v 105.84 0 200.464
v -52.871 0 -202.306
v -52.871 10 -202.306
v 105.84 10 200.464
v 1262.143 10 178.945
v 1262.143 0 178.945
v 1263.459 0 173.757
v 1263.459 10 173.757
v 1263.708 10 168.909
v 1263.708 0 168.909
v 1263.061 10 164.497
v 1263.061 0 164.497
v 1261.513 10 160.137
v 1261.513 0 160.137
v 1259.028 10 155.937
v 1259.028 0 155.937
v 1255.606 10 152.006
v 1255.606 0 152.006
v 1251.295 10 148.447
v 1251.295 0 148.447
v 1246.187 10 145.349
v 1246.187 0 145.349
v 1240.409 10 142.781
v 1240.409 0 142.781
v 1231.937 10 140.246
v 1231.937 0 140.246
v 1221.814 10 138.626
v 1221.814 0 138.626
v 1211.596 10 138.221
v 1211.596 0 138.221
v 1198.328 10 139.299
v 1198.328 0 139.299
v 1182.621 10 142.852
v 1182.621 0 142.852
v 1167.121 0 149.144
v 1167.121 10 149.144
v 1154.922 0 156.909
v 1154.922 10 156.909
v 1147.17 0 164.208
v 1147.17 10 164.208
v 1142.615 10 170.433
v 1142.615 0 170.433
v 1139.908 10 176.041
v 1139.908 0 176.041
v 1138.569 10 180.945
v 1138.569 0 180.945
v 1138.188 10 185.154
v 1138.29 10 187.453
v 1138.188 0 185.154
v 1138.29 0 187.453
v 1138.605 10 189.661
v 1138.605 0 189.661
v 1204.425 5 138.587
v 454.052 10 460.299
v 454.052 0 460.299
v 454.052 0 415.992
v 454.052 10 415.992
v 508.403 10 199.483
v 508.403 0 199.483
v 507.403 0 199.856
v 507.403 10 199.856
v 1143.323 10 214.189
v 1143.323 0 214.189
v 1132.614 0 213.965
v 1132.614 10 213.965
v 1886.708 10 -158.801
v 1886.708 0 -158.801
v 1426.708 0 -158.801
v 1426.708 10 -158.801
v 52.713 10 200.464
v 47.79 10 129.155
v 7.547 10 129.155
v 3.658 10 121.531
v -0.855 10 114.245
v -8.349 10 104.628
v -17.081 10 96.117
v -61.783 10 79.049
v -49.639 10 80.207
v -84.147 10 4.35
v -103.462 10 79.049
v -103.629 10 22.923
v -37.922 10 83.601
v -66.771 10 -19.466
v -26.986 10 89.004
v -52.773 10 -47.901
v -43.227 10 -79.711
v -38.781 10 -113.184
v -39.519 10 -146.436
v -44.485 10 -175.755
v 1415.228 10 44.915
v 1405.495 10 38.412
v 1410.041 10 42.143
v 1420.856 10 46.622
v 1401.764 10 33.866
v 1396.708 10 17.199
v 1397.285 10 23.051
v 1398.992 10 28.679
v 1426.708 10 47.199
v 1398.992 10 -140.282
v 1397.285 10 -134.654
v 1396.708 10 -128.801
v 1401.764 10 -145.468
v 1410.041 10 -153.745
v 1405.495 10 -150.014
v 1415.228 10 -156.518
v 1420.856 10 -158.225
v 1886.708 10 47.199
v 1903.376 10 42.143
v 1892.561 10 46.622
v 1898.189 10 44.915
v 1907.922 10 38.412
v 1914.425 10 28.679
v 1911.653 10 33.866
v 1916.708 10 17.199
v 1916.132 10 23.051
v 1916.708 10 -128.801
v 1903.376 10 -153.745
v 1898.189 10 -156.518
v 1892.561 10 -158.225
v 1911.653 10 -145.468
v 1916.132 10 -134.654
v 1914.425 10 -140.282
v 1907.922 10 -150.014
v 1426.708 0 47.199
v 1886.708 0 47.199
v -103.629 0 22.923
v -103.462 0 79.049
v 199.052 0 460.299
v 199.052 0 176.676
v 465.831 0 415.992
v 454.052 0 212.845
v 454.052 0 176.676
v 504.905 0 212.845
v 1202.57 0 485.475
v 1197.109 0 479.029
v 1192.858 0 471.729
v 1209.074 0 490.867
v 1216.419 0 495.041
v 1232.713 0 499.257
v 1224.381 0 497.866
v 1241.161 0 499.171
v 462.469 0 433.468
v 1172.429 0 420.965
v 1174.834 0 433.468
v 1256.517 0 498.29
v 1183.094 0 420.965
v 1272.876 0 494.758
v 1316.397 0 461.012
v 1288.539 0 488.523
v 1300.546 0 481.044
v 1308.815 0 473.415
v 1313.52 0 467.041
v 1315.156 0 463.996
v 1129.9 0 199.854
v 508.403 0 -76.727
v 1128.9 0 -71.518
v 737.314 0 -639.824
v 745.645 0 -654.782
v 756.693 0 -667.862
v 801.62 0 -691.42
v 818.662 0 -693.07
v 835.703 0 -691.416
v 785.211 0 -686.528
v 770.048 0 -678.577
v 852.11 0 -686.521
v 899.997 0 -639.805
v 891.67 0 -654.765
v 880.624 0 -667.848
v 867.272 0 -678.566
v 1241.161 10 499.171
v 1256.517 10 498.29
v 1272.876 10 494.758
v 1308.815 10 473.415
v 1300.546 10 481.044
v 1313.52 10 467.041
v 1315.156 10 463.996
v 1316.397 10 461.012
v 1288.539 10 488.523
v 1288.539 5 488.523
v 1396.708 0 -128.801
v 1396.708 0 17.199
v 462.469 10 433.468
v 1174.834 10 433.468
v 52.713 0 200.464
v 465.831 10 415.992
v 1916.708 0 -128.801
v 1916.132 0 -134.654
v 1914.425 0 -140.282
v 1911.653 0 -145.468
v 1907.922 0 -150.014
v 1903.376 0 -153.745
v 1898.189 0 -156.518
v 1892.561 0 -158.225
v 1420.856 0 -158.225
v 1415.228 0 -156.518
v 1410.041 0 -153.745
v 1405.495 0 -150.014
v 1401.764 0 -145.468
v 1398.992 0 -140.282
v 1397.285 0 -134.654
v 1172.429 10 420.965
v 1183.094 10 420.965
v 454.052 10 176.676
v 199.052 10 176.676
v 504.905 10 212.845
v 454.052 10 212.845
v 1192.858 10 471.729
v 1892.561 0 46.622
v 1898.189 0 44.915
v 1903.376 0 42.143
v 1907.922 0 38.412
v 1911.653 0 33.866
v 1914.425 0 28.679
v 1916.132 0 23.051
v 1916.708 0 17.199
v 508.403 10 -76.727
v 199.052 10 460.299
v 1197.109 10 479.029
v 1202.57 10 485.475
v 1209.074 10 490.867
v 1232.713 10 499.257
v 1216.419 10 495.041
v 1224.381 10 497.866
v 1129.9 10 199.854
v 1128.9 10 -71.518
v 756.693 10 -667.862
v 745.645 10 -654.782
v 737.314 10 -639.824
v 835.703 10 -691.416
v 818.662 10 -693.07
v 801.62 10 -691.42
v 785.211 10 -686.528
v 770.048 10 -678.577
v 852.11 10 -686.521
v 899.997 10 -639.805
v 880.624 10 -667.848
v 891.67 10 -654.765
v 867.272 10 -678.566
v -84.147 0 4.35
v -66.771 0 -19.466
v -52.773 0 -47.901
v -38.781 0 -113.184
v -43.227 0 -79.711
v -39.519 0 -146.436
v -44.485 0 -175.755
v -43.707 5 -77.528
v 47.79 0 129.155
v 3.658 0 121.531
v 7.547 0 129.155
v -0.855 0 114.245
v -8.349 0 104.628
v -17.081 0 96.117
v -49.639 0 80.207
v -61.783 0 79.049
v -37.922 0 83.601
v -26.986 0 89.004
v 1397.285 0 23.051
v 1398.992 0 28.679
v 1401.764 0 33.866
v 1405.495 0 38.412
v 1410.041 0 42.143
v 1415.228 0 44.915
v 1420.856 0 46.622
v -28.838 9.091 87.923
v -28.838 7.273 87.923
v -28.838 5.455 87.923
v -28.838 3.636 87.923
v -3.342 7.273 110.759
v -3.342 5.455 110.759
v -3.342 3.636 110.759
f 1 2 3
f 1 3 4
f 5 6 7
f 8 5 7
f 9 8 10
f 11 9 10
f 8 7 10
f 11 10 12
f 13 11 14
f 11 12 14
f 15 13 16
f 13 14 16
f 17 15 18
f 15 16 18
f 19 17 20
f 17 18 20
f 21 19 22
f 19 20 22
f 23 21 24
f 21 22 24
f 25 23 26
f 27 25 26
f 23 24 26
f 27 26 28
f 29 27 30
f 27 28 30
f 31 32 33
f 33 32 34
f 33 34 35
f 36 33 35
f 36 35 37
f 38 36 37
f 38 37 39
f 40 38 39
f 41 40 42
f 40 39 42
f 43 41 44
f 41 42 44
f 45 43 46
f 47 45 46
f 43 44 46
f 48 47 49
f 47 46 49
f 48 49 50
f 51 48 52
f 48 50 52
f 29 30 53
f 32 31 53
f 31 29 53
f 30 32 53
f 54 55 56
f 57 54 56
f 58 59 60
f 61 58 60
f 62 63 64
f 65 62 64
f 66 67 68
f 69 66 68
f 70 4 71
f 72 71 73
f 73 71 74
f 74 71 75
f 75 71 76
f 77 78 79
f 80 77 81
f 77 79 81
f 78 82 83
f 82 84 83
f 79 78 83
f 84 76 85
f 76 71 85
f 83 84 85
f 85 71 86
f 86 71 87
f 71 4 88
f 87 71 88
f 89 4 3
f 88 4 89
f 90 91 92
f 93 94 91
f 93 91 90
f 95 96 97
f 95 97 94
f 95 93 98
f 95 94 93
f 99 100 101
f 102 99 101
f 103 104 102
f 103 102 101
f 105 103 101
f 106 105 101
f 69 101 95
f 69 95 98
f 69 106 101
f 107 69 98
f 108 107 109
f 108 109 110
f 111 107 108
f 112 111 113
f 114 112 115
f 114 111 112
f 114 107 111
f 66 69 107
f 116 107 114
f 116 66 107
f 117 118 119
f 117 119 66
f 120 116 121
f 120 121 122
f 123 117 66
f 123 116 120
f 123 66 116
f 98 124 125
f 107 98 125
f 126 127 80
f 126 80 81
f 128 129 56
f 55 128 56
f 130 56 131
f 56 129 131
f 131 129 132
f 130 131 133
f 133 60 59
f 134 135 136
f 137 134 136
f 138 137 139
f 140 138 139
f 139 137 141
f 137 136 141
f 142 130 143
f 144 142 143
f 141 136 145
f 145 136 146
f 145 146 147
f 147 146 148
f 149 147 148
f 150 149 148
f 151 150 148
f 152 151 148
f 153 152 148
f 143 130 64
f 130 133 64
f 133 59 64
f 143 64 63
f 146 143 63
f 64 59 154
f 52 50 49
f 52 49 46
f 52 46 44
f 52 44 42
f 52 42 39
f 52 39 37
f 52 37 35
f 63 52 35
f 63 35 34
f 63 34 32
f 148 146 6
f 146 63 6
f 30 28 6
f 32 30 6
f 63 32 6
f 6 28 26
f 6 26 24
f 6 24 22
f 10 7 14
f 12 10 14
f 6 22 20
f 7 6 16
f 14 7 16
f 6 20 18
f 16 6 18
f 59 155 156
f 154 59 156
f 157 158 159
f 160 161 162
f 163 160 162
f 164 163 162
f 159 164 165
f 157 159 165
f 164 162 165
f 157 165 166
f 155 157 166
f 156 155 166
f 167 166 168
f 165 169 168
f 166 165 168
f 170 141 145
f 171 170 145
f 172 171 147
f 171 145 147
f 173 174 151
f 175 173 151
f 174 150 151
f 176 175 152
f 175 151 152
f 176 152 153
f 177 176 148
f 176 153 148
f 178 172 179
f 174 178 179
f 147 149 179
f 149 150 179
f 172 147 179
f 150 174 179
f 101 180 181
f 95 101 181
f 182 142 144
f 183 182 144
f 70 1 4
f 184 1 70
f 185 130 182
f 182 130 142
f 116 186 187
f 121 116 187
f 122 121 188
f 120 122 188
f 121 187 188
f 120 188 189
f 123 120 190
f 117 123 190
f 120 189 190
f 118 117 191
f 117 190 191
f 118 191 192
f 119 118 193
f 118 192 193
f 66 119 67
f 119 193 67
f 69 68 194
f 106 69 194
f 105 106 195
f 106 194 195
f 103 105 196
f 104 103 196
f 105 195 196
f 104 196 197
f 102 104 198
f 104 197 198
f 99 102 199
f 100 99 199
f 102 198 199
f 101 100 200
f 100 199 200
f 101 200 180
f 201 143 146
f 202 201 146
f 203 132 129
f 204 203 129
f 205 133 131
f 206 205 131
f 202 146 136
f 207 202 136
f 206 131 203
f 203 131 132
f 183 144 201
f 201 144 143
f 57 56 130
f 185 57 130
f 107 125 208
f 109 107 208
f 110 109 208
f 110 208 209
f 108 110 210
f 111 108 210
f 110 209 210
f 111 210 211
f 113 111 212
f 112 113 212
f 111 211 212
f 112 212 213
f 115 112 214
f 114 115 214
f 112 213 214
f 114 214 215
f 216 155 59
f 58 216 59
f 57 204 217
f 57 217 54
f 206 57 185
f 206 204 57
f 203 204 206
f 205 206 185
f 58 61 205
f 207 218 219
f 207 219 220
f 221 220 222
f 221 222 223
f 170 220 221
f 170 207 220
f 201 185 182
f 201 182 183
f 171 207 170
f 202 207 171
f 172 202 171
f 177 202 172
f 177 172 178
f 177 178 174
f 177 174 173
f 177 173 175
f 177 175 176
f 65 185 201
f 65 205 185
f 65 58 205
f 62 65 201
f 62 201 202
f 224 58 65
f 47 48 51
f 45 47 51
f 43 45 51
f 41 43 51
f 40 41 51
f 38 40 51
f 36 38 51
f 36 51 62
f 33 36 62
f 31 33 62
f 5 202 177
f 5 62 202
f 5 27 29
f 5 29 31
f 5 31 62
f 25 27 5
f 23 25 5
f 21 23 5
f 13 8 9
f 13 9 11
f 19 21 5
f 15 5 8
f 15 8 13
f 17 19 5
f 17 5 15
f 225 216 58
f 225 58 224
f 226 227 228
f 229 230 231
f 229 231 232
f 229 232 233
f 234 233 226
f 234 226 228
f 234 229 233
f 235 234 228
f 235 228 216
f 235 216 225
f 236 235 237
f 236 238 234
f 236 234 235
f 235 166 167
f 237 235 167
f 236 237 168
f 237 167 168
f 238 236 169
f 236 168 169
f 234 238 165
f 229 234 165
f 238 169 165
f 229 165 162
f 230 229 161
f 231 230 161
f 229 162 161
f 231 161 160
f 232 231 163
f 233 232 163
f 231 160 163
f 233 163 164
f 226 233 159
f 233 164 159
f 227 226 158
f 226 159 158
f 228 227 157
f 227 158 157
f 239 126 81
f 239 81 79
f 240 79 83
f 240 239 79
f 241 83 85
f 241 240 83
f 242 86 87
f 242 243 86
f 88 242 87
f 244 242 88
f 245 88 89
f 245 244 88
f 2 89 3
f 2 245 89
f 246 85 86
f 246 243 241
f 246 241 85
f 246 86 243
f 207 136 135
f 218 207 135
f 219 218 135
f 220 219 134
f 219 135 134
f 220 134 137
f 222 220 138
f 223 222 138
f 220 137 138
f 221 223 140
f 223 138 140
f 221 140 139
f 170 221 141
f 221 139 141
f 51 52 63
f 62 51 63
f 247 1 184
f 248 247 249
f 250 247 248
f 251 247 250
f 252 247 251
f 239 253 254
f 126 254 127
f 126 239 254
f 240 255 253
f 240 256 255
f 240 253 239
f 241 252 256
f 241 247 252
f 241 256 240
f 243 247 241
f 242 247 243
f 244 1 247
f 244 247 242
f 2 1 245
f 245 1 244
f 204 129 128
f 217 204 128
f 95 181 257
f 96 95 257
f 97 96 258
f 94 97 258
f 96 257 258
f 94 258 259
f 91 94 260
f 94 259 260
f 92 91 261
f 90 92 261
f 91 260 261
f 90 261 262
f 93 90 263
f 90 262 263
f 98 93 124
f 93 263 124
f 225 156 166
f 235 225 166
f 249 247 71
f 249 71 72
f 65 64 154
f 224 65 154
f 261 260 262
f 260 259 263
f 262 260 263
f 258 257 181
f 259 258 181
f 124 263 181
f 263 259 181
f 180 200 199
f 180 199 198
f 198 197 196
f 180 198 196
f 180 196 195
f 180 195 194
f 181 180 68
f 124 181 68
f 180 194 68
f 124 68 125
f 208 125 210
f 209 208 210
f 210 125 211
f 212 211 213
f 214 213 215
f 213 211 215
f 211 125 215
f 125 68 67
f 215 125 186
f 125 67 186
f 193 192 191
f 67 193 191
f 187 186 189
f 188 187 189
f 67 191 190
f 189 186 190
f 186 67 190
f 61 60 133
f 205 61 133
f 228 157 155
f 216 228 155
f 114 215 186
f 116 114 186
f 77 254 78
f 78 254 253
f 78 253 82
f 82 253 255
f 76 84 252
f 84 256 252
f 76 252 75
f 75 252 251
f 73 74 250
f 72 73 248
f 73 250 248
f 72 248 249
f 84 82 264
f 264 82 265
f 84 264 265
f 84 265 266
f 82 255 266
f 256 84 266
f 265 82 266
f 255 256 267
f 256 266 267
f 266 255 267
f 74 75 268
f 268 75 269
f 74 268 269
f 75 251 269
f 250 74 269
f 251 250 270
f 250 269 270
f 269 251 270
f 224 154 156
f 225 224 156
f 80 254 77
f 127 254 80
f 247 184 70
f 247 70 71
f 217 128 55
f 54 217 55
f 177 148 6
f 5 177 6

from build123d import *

# Parameters (mm, degrees)
BOSS_EXTRUDE1_DEPTH = 10
BOSS_EXTRUDE2_DEPTH = 10
BOSS_EXTRUDE3_DEPTH = 10


with BuildPart() as part:
    # Sketch1 → Boss-Extrude1 (new body)
    with BuildSketch(Plane(origin=(0, 0, 0), x_dir=(1, 0, 0), z_dir=(0, 1, 0))):
        with BuildLine():
            Line((52.712981147, -200.46355289), (47.790345597, -129.154704003))
            Line((47.790345597, -129.154704003), (7.546555416, -129.154704003))
            add(Edge.make_bspline(
                [(-61.78325808, -79.049159175), (-59.624624056, -79.112045243), (-55.427904423, -79.234305519), (-49.389122898, -80.172269264), (-43.85279654, -81.513461678), (-38.874327208, -83.172102105), (-34.486803674, -84.997618704), (-30.704381342, -86.863222673), (-26.372562418, -89.301162722), (-21.495910227, -92.5282526), (-12.950036968, -99.343739915), (-2.253816449, -111.022656411), (4.566450288, -122.685389209), (7.546555416, -129.154704003)],
                knots=[0, 0, 0, 0, 0.04544241, 0.088347099, 0.128406028, 0.165306616, 0.198741876, 0.228422313, 0.254086731, 0.303421336, 0.35144752, 0.484303034, 0.635079233, 0.635079233, 0.635079233, 0.635079233], degree=3))
            Line((-61.78325808, -79.049159175), (-103.462229108, -79.049159175))
            Line((-103.462229108, -79.049159175), (-103.629081372, -22.92287626))
            add(Edge.make_bspline(
                [(-103.629081372, -22.92287626), (2.742841741, 61.171512772), (-52.870933457, 202.305804128)],
                knots=[3.705535295, 3.705535295, 3.705535295, 5.170067535, 5.170067535, 5.170067535], degree=2, weights=[1, 0.743661284, 1]))
            Line((-52.870933457, 202.305804128), (105.839782858, -200.46355289))
            Line((105.839782858, -200.46355289), (52.712981147, -200.46355289))
        make_face()
    extrude(amount=BOSS_EXTRUDE1_DEPTH)


with BuildPart() as body_2:
    # Sketch3 → Boss-Extrude2 (new body)
    with BuildSketch(Plane(origin=(0, 0, 0), x_dir=(1, 0, 0), z_dir=(0, 1, 0))):
        with BuildLine():
            Line((1128.899745939, 71.518232222), (899.997264322, 639.805151885))
            ThreePointArc((899.997264322, 639.805151885), (818.661659338, 693.069632592), (737.313859069, 639.823778908))
            Line((737.313859069, 639.823778908), (508.403094205, 76.72722767))
            Line((508.403094205, 76.72722767), (508.403094205, -199.483404134))
            Line((508.403094205, -199.483404134), (507.403094205, -199.855558726))
            Line((507.403094205, -199.855558726), (504.904572588, -212.845486475))
            Line((504.904572588, -212.845486475), (454.052065144, -212.845486475))
            Line((454.052065144, -212.845486475), (454.052065144, -176.675723923))
            Line((454.052065144, -176.675723923), (199.052065144, -176.675723923))
            Line((199.052065144, -176.675723923), (199.052065144, -460.298738681))
            Line((199.052065144, -460.298738681), (454.052065144, -460.298738681))
            Line((454.052065144, -460.298738681), (454.052065144, -415.992210629))
            Line((454.052065144, -415.992210629), (465.830723093, -415.992210629))
            Line((465.830723093, -415.992210629), (462.469305937, -433.468371605))
            Line((462.469305937, -433.468371605), (818.651419411, -433.468371605))
            Line((818.651419411, -433.468371605), (1174.833534208, -433.468371605))
            Line((1174.833534208, -433.468371605), (1172.428602461, -420.964947552))
            Line((1172.428602461, -420.964947552), (1183.094477094, -420.964947552))
            Line((1183.094477094, -420.964947552), (1192.858446813, -471.728572756))
            ThreePointArc((1192.858446813, -471.728572756), (1212.654596204, -493.115293069), (1241.160905905, -499.170839593))
            add(Edge.make_bspline(
                [(1241.160905905, -499.170839593), (1302.342117862, -500.447901399), (1316.396673087, -461.011770903)],
                knots=[1.229562744, 1.229562744, 1.229562744, 2.80035907, 2.80035907, 2.80035907], degree=2, weights=[1, 0.707106781, 1]))
            Line((1316.396673087, -461.011770903), (1262.143367489, -178.944686432))
            add(Edge.make_bspline(
                [(1262.143367489, -178.944686432), (1278.826483722, -132.132991693), (1204.424670567, -138.587265104), (1130.022857412, -145.041538515), (1138.605141215, -189.661488285)],
                knots=[5.941951724, 5.941951724, 5.941951724, 7.683364842, 7.683364842, 9.424777961, 9.424777961, 9.424777961], degree=2, weights=[1, 0.644286343, 1, 0.644286343, 1]))
            Line((1138.605141215, -189.661488285), (1143.322812908, -214.189024171))
            Line((1143.322812908, -214.189024171), (1132.61394394, -213.965493334))
            Line((1132.61394394, -213.965493334), (1129.899745939, -199.854170377))
            Line((1129.899745939, -199.854170377), (1128.899745939, 71.518232222))
        make_face()
    extrude(amount=BOSS_EXTRUDE2_DEPTH)


with BuildPart() as body_3:
    # Sketch4 → Boss-Extrude3 (new body)
    with BuildSketch(Plane(origin=(0, 0, 0), x_dir=(1, 0, 0), z_dir=(0, 1, 0))):
        with BuildLine():
            Line((1426.708497639, -47.198712871), (1886.708497639, -47.198712871))
            ThreePointArc((1886.708497639, -47.198712871), (1907.921701074, -38.411916307), (1916.708497639, -17.198712871))
            Line((1916.708497639, -17.198712871), (1916.708497639, 128.801287129))
            ThreePointArc((1916.708497639, 128.801287129), (1907.921701074, 150.014490564), (1886.708497639, 158.801287129))
            Line((1886.708497639, 158.801287129), (1426.708497639, 158.801287129))
            ThreePointArc((1426.708497639, 158.801287129), (1405.495294203, 150.014490564), (1396.708497639, 128.801287129))
            Line((1396.708497639, 128.801287129), (1396.708497639, -17.198712871))
            ThreePointArc((1396.708497639, -17.198712871), (1405.495294203, -38.411916307), (1426.708497639, -47.198712871))
        make_face()
    extrude(amount=BOSS_EXTRUDE3_DEPTH)


solid = Compound([part.part, body_2.part, body_3.part])
